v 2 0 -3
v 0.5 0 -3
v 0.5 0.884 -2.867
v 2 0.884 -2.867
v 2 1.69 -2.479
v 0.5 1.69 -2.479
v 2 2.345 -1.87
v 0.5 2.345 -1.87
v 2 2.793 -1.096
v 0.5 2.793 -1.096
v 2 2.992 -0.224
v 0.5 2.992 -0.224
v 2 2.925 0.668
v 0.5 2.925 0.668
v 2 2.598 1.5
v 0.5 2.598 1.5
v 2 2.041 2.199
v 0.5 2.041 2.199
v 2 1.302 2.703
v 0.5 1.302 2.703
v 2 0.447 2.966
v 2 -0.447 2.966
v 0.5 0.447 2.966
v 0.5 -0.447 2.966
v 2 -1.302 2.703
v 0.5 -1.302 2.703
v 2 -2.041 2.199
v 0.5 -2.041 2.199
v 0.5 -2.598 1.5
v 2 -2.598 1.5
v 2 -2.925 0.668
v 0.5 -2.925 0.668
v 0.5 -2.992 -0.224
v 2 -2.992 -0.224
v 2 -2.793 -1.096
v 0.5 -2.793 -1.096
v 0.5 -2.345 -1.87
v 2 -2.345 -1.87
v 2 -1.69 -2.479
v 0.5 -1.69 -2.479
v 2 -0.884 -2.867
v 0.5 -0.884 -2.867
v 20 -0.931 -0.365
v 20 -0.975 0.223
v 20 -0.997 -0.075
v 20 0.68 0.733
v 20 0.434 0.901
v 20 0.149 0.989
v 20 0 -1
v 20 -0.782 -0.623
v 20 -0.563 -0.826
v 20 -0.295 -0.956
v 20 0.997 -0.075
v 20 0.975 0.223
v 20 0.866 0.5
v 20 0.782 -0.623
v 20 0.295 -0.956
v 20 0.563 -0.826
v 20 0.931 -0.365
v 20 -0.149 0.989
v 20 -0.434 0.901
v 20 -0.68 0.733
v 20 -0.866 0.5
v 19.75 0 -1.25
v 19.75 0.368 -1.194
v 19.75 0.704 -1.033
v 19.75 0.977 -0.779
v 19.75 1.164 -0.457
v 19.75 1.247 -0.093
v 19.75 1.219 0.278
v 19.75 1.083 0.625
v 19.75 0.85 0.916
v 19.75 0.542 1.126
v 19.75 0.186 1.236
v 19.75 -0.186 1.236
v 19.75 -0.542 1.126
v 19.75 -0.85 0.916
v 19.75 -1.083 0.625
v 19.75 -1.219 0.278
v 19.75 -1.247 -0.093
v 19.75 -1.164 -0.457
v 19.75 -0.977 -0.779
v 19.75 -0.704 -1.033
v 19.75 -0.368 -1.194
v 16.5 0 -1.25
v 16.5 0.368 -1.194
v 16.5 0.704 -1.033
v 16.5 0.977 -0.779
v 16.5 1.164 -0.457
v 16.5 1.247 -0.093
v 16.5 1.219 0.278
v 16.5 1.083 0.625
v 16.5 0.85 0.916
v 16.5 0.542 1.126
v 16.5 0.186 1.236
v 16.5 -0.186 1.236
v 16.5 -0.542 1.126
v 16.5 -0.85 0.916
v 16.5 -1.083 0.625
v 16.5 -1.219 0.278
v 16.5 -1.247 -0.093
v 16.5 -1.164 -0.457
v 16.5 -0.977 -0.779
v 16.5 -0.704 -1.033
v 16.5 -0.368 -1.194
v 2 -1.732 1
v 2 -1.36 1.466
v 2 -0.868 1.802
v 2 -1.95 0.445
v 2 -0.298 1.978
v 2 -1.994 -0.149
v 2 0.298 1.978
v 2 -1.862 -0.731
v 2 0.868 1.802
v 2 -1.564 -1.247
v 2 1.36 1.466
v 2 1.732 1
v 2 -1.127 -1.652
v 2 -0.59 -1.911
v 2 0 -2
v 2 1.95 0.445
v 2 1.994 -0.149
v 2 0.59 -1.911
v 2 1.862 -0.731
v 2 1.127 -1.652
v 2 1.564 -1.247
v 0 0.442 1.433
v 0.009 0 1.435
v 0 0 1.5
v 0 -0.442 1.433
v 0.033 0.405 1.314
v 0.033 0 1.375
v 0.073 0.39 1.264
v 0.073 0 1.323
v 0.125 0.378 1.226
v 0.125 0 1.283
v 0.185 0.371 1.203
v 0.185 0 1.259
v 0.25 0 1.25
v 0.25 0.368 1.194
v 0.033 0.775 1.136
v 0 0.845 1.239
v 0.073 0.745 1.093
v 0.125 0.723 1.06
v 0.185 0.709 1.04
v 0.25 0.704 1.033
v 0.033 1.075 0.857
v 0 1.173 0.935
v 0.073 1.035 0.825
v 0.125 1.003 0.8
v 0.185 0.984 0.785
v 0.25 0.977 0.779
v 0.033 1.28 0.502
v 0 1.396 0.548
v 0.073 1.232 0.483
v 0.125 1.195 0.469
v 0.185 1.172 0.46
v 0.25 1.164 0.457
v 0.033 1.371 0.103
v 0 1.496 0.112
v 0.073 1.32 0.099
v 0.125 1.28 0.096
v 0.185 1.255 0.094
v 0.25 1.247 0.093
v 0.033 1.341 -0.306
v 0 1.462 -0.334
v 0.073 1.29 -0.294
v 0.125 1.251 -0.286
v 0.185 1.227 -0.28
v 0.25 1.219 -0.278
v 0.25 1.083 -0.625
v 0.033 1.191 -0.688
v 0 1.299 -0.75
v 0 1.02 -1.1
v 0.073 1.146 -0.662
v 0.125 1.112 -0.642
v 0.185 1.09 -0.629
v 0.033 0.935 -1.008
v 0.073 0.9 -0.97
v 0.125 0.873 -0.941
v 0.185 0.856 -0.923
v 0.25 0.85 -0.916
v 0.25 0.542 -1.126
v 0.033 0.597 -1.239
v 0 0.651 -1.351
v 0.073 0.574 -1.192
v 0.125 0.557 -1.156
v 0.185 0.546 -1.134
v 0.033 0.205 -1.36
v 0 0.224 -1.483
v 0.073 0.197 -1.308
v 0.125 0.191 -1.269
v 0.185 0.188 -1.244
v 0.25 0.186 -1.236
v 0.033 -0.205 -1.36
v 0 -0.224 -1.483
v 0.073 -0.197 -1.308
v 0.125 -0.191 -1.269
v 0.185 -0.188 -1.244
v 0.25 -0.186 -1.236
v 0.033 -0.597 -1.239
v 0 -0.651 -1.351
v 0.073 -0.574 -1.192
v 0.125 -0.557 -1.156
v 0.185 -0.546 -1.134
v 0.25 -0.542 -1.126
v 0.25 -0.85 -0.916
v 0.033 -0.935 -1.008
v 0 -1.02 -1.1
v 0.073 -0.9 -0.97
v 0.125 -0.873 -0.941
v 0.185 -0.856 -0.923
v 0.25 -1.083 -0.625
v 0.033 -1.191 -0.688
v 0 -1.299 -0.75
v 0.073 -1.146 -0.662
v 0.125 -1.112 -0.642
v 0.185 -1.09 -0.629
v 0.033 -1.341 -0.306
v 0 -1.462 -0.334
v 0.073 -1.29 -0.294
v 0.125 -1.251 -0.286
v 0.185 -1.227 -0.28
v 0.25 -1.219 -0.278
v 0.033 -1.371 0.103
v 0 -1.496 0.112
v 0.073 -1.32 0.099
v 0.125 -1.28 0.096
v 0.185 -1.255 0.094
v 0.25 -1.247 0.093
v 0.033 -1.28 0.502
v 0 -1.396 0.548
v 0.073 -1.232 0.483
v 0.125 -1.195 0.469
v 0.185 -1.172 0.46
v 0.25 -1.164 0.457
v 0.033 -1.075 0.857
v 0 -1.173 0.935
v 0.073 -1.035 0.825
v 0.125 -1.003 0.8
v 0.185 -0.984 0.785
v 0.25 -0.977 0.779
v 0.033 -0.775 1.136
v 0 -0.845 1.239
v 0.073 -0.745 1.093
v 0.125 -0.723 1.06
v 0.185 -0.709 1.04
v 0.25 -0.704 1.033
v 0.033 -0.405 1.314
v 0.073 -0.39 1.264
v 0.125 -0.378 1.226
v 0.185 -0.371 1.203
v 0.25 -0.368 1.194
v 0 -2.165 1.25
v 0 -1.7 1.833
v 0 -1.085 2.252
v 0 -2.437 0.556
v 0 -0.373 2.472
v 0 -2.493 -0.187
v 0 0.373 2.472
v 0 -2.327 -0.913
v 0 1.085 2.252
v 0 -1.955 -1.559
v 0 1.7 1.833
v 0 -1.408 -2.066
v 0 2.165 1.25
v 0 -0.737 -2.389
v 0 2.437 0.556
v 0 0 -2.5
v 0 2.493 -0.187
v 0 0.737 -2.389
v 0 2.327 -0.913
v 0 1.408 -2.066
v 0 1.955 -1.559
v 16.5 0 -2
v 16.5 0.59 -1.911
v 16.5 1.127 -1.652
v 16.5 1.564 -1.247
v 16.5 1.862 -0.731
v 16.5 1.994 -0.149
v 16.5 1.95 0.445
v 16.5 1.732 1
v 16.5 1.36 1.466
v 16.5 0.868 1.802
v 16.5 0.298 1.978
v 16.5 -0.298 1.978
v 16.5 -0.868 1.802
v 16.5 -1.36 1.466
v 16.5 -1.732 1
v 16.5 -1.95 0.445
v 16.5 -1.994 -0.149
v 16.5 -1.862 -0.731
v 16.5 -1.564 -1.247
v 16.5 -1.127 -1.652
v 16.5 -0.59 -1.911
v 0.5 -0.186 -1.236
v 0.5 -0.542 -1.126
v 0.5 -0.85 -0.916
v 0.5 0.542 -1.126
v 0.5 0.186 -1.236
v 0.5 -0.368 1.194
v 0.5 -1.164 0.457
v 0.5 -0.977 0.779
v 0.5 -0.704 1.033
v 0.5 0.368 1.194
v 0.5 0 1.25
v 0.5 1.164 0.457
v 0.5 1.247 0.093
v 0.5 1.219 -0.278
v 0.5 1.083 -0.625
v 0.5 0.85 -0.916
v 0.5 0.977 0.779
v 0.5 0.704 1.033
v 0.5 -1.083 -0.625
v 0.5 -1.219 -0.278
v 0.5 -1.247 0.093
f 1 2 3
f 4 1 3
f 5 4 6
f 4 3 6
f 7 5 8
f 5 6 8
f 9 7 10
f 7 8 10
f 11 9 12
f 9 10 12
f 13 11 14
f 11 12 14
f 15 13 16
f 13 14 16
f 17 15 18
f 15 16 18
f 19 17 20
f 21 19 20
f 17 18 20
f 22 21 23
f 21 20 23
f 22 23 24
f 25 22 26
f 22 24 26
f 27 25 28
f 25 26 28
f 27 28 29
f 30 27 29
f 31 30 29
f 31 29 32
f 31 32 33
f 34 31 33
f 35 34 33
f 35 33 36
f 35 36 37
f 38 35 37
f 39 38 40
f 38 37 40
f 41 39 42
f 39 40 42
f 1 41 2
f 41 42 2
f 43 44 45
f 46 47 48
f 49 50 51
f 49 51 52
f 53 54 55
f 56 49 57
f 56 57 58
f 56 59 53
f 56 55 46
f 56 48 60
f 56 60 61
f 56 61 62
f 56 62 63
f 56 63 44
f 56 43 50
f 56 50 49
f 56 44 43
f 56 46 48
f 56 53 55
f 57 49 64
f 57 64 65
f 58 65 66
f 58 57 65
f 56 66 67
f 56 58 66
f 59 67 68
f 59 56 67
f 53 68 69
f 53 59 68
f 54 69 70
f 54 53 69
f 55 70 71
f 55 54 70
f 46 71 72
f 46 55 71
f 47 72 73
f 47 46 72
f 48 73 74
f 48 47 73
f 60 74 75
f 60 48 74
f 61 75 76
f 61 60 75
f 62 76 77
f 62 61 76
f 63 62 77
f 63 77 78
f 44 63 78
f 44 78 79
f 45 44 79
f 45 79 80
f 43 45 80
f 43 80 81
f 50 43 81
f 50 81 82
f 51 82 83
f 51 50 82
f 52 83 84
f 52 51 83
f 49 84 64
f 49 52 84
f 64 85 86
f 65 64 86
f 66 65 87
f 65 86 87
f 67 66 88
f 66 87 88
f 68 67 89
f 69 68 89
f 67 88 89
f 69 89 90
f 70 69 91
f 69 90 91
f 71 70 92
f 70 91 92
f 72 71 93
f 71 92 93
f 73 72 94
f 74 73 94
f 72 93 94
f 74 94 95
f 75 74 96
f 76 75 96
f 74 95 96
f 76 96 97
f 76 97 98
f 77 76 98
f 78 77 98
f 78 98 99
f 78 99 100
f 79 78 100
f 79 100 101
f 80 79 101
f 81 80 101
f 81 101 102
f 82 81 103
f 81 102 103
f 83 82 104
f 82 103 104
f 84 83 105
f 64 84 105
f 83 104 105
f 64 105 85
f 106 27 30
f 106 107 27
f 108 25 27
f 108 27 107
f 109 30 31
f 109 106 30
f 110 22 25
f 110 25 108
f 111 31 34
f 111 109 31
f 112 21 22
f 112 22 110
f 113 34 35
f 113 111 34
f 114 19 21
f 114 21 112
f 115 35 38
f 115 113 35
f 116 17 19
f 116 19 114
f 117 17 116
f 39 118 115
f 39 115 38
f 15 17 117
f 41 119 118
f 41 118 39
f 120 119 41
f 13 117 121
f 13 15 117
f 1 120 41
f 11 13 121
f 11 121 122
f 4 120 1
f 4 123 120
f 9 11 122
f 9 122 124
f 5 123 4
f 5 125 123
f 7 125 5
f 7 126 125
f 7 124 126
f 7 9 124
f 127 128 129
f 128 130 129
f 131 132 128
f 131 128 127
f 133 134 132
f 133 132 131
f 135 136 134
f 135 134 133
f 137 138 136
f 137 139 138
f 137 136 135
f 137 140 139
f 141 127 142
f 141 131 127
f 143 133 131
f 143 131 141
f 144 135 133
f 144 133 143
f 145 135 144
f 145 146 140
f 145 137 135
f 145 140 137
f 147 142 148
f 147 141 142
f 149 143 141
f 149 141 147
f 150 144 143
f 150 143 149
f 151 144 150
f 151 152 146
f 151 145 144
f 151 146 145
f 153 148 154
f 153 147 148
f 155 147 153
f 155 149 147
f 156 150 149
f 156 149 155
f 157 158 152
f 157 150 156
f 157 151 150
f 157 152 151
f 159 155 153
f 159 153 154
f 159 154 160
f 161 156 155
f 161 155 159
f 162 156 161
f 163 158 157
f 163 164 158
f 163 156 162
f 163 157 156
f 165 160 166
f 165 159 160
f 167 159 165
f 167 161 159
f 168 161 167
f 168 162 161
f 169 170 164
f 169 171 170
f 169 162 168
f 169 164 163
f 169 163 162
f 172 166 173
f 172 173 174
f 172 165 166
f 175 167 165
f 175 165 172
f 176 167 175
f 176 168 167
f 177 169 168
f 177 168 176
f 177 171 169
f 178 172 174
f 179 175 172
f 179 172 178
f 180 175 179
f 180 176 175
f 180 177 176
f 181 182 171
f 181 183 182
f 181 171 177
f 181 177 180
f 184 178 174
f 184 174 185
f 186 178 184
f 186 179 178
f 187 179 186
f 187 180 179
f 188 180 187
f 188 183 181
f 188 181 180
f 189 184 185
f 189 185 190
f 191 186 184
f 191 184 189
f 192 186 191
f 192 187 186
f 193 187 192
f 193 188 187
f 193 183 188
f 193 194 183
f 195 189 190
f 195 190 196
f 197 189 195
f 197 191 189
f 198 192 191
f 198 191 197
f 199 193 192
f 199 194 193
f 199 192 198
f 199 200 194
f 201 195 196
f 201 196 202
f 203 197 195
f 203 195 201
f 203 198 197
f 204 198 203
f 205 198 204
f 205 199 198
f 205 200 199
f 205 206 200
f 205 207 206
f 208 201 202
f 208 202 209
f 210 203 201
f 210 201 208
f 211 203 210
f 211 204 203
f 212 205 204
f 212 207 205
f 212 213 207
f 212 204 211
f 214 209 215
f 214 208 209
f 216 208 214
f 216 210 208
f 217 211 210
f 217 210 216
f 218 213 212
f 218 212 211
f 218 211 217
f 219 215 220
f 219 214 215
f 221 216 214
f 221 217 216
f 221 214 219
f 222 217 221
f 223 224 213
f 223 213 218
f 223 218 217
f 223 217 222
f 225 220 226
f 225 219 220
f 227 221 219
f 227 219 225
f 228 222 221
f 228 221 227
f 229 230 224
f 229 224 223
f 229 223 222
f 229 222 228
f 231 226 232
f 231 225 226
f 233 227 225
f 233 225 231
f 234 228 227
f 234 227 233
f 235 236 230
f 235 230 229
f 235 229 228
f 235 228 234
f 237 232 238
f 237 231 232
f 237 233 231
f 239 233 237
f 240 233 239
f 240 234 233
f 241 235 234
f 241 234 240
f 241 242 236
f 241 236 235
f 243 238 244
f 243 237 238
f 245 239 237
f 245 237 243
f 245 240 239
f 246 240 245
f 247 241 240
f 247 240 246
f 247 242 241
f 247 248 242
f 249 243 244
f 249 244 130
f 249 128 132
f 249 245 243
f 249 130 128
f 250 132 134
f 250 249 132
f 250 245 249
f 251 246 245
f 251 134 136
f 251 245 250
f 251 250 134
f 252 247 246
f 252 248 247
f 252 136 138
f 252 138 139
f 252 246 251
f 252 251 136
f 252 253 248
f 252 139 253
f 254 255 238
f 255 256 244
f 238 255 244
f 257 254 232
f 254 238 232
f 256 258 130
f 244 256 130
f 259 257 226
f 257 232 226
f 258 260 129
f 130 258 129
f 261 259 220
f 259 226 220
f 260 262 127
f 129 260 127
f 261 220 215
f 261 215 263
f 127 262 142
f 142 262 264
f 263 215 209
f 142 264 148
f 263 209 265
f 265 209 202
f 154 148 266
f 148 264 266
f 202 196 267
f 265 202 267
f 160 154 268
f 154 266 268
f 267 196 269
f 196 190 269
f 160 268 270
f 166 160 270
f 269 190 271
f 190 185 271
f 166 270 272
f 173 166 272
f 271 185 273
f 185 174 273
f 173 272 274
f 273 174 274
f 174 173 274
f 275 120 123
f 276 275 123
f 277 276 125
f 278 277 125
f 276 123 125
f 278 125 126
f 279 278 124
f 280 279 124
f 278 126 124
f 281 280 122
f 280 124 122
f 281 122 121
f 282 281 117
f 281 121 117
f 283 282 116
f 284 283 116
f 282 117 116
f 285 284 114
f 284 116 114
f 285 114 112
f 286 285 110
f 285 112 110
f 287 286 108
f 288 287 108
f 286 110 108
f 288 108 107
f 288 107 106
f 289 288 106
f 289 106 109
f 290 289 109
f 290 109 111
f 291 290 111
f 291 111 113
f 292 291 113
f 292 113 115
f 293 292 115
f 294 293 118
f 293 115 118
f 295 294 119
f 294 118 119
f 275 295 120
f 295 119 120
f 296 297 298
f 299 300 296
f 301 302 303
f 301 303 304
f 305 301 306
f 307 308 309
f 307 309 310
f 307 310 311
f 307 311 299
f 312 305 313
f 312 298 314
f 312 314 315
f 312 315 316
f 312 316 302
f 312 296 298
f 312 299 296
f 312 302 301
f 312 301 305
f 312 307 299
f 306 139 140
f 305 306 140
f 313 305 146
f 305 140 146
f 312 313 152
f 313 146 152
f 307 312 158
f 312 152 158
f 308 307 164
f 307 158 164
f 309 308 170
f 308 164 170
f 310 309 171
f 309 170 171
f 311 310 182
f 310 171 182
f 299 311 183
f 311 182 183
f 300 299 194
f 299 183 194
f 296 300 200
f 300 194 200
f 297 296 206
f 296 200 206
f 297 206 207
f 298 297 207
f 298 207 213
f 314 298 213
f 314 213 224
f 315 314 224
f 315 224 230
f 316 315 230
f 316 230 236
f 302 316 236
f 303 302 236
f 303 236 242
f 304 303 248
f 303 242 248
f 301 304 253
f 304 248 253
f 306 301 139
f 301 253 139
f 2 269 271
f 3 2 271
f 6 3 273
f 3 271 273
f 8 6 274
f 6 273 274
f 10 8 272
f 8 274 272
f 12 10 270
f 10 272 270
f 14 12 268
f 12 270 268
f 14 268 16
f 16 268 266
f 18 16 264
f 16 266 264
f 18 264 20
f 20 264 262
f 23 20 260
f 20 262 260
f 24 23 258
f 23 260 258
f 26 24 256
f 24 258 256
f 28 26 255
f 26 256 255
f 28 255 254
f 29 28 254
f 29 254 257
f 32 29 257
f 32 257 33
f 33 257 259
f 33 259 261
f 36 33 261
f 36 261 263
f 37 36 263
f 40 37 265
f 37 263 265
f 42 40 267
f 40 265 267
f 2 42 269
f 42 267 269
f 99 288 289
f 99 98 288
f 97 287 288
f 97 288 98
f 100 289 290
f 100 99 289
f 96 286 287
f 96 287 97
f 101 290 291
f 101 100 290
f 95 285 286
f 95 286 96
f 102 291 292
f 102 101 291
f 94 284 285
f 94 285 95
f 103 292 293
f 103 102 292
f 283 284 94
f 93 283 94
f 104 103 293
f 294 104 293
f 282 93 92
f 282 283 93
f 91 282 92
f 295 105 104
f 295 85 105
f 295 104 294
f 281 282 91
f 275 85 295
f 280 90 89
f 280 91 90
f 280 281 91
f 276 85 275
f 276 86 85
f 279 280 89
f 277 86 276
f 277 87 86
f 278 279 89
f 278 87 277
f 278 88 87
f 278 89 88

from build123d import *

# Parameters (mm, degrees)
SKETCH1_R           = 6
BOSS_EXTRUDE1_DEPTH = 4
SKETCH2_R           = 4
BOSS_EXTRUDE2_DEPTH = 29
SKETCH3_R           = 2.5
BOSS_EXTRUDE3_DEPTH = 7
CHAMFER1_SIZE       = 0.5
CHAMFER2_SIZE       = 1
SKETCH4_R           = 2.5
CUT_EXTRUDE1_DEPTH  = 1
FILLET1_R           = 0.5
SCALE1_SCALE        = 0.5


with BuildPart() as part:
    # Sketch1 → Boss-Extrude1 (new body)
    with BuildSketch(Plane(origin=(0, 0, 0), x_dir=(0, 0, -1), z_dir=(1, 0, 0))):
        Circle(SKETCH1_R)
    extrude(amount=BOSS_EXTRUDE1_DEPTH)

    # Sketch2 → Boss-Extrude2 (add)
    with BuildSketch(Plane(origin=(4, 0, 0), x_dir=(0, 0, -1), z_dir=(1, 0, 0))):
        Circle(SKETCH2_R)
    extrude(amount=BOSS_EXTRUDE2_DEPTH)

    # Sketch3 → Boss-Extrude3 (add)
    with BuildSketch(Plane(origin=(33, 0, 0), x_dir=(0, 0, -1), z_dir=(1, 0, 0))):
        Circle(SKETCH3_R)
    extrude(amount=BOSS_EXTRUDE3_DEPTH)

    # Chamfer1
    chamfer1_edges = [part.edges().sort_by_distance(p)[0] for p in [
        (40, 0, 2.5),
    ]]
    chamfer(chamfer1_edges, length=CHAMFER1_SIZE)

    # Chamfer2
    chamfer2_edges = [part.edges().sort_by_distance(p)[0] for p in [
        (0, 0, 6),
    ]]
    chamfer(chamfer2_edges, length=CHAMFER2_SIZE)

    # Sketch4 → Cut-Extrude1 (cut)
    with BuildSketch(Plane.ZY):
        Circle(SKETCH4_R)
    extrude(amount=-CUT_EXTRUDE1_DEPTH, mode=Mode.SUBTRACT)

    # Fillet1
    fillet1_edges = [part.edges().sort_by_distance(p)[0] for p in [
        (0, 0, -2.5),
    ]]
    fillet(fillet1_edges, radius=FILLET1_R)


with BuildPart() as part_1:
    # Scale1: scaled about (0, 0, 0)
    add(part.part.scale(SCALE1_SCALE))


solid = part_1.part
